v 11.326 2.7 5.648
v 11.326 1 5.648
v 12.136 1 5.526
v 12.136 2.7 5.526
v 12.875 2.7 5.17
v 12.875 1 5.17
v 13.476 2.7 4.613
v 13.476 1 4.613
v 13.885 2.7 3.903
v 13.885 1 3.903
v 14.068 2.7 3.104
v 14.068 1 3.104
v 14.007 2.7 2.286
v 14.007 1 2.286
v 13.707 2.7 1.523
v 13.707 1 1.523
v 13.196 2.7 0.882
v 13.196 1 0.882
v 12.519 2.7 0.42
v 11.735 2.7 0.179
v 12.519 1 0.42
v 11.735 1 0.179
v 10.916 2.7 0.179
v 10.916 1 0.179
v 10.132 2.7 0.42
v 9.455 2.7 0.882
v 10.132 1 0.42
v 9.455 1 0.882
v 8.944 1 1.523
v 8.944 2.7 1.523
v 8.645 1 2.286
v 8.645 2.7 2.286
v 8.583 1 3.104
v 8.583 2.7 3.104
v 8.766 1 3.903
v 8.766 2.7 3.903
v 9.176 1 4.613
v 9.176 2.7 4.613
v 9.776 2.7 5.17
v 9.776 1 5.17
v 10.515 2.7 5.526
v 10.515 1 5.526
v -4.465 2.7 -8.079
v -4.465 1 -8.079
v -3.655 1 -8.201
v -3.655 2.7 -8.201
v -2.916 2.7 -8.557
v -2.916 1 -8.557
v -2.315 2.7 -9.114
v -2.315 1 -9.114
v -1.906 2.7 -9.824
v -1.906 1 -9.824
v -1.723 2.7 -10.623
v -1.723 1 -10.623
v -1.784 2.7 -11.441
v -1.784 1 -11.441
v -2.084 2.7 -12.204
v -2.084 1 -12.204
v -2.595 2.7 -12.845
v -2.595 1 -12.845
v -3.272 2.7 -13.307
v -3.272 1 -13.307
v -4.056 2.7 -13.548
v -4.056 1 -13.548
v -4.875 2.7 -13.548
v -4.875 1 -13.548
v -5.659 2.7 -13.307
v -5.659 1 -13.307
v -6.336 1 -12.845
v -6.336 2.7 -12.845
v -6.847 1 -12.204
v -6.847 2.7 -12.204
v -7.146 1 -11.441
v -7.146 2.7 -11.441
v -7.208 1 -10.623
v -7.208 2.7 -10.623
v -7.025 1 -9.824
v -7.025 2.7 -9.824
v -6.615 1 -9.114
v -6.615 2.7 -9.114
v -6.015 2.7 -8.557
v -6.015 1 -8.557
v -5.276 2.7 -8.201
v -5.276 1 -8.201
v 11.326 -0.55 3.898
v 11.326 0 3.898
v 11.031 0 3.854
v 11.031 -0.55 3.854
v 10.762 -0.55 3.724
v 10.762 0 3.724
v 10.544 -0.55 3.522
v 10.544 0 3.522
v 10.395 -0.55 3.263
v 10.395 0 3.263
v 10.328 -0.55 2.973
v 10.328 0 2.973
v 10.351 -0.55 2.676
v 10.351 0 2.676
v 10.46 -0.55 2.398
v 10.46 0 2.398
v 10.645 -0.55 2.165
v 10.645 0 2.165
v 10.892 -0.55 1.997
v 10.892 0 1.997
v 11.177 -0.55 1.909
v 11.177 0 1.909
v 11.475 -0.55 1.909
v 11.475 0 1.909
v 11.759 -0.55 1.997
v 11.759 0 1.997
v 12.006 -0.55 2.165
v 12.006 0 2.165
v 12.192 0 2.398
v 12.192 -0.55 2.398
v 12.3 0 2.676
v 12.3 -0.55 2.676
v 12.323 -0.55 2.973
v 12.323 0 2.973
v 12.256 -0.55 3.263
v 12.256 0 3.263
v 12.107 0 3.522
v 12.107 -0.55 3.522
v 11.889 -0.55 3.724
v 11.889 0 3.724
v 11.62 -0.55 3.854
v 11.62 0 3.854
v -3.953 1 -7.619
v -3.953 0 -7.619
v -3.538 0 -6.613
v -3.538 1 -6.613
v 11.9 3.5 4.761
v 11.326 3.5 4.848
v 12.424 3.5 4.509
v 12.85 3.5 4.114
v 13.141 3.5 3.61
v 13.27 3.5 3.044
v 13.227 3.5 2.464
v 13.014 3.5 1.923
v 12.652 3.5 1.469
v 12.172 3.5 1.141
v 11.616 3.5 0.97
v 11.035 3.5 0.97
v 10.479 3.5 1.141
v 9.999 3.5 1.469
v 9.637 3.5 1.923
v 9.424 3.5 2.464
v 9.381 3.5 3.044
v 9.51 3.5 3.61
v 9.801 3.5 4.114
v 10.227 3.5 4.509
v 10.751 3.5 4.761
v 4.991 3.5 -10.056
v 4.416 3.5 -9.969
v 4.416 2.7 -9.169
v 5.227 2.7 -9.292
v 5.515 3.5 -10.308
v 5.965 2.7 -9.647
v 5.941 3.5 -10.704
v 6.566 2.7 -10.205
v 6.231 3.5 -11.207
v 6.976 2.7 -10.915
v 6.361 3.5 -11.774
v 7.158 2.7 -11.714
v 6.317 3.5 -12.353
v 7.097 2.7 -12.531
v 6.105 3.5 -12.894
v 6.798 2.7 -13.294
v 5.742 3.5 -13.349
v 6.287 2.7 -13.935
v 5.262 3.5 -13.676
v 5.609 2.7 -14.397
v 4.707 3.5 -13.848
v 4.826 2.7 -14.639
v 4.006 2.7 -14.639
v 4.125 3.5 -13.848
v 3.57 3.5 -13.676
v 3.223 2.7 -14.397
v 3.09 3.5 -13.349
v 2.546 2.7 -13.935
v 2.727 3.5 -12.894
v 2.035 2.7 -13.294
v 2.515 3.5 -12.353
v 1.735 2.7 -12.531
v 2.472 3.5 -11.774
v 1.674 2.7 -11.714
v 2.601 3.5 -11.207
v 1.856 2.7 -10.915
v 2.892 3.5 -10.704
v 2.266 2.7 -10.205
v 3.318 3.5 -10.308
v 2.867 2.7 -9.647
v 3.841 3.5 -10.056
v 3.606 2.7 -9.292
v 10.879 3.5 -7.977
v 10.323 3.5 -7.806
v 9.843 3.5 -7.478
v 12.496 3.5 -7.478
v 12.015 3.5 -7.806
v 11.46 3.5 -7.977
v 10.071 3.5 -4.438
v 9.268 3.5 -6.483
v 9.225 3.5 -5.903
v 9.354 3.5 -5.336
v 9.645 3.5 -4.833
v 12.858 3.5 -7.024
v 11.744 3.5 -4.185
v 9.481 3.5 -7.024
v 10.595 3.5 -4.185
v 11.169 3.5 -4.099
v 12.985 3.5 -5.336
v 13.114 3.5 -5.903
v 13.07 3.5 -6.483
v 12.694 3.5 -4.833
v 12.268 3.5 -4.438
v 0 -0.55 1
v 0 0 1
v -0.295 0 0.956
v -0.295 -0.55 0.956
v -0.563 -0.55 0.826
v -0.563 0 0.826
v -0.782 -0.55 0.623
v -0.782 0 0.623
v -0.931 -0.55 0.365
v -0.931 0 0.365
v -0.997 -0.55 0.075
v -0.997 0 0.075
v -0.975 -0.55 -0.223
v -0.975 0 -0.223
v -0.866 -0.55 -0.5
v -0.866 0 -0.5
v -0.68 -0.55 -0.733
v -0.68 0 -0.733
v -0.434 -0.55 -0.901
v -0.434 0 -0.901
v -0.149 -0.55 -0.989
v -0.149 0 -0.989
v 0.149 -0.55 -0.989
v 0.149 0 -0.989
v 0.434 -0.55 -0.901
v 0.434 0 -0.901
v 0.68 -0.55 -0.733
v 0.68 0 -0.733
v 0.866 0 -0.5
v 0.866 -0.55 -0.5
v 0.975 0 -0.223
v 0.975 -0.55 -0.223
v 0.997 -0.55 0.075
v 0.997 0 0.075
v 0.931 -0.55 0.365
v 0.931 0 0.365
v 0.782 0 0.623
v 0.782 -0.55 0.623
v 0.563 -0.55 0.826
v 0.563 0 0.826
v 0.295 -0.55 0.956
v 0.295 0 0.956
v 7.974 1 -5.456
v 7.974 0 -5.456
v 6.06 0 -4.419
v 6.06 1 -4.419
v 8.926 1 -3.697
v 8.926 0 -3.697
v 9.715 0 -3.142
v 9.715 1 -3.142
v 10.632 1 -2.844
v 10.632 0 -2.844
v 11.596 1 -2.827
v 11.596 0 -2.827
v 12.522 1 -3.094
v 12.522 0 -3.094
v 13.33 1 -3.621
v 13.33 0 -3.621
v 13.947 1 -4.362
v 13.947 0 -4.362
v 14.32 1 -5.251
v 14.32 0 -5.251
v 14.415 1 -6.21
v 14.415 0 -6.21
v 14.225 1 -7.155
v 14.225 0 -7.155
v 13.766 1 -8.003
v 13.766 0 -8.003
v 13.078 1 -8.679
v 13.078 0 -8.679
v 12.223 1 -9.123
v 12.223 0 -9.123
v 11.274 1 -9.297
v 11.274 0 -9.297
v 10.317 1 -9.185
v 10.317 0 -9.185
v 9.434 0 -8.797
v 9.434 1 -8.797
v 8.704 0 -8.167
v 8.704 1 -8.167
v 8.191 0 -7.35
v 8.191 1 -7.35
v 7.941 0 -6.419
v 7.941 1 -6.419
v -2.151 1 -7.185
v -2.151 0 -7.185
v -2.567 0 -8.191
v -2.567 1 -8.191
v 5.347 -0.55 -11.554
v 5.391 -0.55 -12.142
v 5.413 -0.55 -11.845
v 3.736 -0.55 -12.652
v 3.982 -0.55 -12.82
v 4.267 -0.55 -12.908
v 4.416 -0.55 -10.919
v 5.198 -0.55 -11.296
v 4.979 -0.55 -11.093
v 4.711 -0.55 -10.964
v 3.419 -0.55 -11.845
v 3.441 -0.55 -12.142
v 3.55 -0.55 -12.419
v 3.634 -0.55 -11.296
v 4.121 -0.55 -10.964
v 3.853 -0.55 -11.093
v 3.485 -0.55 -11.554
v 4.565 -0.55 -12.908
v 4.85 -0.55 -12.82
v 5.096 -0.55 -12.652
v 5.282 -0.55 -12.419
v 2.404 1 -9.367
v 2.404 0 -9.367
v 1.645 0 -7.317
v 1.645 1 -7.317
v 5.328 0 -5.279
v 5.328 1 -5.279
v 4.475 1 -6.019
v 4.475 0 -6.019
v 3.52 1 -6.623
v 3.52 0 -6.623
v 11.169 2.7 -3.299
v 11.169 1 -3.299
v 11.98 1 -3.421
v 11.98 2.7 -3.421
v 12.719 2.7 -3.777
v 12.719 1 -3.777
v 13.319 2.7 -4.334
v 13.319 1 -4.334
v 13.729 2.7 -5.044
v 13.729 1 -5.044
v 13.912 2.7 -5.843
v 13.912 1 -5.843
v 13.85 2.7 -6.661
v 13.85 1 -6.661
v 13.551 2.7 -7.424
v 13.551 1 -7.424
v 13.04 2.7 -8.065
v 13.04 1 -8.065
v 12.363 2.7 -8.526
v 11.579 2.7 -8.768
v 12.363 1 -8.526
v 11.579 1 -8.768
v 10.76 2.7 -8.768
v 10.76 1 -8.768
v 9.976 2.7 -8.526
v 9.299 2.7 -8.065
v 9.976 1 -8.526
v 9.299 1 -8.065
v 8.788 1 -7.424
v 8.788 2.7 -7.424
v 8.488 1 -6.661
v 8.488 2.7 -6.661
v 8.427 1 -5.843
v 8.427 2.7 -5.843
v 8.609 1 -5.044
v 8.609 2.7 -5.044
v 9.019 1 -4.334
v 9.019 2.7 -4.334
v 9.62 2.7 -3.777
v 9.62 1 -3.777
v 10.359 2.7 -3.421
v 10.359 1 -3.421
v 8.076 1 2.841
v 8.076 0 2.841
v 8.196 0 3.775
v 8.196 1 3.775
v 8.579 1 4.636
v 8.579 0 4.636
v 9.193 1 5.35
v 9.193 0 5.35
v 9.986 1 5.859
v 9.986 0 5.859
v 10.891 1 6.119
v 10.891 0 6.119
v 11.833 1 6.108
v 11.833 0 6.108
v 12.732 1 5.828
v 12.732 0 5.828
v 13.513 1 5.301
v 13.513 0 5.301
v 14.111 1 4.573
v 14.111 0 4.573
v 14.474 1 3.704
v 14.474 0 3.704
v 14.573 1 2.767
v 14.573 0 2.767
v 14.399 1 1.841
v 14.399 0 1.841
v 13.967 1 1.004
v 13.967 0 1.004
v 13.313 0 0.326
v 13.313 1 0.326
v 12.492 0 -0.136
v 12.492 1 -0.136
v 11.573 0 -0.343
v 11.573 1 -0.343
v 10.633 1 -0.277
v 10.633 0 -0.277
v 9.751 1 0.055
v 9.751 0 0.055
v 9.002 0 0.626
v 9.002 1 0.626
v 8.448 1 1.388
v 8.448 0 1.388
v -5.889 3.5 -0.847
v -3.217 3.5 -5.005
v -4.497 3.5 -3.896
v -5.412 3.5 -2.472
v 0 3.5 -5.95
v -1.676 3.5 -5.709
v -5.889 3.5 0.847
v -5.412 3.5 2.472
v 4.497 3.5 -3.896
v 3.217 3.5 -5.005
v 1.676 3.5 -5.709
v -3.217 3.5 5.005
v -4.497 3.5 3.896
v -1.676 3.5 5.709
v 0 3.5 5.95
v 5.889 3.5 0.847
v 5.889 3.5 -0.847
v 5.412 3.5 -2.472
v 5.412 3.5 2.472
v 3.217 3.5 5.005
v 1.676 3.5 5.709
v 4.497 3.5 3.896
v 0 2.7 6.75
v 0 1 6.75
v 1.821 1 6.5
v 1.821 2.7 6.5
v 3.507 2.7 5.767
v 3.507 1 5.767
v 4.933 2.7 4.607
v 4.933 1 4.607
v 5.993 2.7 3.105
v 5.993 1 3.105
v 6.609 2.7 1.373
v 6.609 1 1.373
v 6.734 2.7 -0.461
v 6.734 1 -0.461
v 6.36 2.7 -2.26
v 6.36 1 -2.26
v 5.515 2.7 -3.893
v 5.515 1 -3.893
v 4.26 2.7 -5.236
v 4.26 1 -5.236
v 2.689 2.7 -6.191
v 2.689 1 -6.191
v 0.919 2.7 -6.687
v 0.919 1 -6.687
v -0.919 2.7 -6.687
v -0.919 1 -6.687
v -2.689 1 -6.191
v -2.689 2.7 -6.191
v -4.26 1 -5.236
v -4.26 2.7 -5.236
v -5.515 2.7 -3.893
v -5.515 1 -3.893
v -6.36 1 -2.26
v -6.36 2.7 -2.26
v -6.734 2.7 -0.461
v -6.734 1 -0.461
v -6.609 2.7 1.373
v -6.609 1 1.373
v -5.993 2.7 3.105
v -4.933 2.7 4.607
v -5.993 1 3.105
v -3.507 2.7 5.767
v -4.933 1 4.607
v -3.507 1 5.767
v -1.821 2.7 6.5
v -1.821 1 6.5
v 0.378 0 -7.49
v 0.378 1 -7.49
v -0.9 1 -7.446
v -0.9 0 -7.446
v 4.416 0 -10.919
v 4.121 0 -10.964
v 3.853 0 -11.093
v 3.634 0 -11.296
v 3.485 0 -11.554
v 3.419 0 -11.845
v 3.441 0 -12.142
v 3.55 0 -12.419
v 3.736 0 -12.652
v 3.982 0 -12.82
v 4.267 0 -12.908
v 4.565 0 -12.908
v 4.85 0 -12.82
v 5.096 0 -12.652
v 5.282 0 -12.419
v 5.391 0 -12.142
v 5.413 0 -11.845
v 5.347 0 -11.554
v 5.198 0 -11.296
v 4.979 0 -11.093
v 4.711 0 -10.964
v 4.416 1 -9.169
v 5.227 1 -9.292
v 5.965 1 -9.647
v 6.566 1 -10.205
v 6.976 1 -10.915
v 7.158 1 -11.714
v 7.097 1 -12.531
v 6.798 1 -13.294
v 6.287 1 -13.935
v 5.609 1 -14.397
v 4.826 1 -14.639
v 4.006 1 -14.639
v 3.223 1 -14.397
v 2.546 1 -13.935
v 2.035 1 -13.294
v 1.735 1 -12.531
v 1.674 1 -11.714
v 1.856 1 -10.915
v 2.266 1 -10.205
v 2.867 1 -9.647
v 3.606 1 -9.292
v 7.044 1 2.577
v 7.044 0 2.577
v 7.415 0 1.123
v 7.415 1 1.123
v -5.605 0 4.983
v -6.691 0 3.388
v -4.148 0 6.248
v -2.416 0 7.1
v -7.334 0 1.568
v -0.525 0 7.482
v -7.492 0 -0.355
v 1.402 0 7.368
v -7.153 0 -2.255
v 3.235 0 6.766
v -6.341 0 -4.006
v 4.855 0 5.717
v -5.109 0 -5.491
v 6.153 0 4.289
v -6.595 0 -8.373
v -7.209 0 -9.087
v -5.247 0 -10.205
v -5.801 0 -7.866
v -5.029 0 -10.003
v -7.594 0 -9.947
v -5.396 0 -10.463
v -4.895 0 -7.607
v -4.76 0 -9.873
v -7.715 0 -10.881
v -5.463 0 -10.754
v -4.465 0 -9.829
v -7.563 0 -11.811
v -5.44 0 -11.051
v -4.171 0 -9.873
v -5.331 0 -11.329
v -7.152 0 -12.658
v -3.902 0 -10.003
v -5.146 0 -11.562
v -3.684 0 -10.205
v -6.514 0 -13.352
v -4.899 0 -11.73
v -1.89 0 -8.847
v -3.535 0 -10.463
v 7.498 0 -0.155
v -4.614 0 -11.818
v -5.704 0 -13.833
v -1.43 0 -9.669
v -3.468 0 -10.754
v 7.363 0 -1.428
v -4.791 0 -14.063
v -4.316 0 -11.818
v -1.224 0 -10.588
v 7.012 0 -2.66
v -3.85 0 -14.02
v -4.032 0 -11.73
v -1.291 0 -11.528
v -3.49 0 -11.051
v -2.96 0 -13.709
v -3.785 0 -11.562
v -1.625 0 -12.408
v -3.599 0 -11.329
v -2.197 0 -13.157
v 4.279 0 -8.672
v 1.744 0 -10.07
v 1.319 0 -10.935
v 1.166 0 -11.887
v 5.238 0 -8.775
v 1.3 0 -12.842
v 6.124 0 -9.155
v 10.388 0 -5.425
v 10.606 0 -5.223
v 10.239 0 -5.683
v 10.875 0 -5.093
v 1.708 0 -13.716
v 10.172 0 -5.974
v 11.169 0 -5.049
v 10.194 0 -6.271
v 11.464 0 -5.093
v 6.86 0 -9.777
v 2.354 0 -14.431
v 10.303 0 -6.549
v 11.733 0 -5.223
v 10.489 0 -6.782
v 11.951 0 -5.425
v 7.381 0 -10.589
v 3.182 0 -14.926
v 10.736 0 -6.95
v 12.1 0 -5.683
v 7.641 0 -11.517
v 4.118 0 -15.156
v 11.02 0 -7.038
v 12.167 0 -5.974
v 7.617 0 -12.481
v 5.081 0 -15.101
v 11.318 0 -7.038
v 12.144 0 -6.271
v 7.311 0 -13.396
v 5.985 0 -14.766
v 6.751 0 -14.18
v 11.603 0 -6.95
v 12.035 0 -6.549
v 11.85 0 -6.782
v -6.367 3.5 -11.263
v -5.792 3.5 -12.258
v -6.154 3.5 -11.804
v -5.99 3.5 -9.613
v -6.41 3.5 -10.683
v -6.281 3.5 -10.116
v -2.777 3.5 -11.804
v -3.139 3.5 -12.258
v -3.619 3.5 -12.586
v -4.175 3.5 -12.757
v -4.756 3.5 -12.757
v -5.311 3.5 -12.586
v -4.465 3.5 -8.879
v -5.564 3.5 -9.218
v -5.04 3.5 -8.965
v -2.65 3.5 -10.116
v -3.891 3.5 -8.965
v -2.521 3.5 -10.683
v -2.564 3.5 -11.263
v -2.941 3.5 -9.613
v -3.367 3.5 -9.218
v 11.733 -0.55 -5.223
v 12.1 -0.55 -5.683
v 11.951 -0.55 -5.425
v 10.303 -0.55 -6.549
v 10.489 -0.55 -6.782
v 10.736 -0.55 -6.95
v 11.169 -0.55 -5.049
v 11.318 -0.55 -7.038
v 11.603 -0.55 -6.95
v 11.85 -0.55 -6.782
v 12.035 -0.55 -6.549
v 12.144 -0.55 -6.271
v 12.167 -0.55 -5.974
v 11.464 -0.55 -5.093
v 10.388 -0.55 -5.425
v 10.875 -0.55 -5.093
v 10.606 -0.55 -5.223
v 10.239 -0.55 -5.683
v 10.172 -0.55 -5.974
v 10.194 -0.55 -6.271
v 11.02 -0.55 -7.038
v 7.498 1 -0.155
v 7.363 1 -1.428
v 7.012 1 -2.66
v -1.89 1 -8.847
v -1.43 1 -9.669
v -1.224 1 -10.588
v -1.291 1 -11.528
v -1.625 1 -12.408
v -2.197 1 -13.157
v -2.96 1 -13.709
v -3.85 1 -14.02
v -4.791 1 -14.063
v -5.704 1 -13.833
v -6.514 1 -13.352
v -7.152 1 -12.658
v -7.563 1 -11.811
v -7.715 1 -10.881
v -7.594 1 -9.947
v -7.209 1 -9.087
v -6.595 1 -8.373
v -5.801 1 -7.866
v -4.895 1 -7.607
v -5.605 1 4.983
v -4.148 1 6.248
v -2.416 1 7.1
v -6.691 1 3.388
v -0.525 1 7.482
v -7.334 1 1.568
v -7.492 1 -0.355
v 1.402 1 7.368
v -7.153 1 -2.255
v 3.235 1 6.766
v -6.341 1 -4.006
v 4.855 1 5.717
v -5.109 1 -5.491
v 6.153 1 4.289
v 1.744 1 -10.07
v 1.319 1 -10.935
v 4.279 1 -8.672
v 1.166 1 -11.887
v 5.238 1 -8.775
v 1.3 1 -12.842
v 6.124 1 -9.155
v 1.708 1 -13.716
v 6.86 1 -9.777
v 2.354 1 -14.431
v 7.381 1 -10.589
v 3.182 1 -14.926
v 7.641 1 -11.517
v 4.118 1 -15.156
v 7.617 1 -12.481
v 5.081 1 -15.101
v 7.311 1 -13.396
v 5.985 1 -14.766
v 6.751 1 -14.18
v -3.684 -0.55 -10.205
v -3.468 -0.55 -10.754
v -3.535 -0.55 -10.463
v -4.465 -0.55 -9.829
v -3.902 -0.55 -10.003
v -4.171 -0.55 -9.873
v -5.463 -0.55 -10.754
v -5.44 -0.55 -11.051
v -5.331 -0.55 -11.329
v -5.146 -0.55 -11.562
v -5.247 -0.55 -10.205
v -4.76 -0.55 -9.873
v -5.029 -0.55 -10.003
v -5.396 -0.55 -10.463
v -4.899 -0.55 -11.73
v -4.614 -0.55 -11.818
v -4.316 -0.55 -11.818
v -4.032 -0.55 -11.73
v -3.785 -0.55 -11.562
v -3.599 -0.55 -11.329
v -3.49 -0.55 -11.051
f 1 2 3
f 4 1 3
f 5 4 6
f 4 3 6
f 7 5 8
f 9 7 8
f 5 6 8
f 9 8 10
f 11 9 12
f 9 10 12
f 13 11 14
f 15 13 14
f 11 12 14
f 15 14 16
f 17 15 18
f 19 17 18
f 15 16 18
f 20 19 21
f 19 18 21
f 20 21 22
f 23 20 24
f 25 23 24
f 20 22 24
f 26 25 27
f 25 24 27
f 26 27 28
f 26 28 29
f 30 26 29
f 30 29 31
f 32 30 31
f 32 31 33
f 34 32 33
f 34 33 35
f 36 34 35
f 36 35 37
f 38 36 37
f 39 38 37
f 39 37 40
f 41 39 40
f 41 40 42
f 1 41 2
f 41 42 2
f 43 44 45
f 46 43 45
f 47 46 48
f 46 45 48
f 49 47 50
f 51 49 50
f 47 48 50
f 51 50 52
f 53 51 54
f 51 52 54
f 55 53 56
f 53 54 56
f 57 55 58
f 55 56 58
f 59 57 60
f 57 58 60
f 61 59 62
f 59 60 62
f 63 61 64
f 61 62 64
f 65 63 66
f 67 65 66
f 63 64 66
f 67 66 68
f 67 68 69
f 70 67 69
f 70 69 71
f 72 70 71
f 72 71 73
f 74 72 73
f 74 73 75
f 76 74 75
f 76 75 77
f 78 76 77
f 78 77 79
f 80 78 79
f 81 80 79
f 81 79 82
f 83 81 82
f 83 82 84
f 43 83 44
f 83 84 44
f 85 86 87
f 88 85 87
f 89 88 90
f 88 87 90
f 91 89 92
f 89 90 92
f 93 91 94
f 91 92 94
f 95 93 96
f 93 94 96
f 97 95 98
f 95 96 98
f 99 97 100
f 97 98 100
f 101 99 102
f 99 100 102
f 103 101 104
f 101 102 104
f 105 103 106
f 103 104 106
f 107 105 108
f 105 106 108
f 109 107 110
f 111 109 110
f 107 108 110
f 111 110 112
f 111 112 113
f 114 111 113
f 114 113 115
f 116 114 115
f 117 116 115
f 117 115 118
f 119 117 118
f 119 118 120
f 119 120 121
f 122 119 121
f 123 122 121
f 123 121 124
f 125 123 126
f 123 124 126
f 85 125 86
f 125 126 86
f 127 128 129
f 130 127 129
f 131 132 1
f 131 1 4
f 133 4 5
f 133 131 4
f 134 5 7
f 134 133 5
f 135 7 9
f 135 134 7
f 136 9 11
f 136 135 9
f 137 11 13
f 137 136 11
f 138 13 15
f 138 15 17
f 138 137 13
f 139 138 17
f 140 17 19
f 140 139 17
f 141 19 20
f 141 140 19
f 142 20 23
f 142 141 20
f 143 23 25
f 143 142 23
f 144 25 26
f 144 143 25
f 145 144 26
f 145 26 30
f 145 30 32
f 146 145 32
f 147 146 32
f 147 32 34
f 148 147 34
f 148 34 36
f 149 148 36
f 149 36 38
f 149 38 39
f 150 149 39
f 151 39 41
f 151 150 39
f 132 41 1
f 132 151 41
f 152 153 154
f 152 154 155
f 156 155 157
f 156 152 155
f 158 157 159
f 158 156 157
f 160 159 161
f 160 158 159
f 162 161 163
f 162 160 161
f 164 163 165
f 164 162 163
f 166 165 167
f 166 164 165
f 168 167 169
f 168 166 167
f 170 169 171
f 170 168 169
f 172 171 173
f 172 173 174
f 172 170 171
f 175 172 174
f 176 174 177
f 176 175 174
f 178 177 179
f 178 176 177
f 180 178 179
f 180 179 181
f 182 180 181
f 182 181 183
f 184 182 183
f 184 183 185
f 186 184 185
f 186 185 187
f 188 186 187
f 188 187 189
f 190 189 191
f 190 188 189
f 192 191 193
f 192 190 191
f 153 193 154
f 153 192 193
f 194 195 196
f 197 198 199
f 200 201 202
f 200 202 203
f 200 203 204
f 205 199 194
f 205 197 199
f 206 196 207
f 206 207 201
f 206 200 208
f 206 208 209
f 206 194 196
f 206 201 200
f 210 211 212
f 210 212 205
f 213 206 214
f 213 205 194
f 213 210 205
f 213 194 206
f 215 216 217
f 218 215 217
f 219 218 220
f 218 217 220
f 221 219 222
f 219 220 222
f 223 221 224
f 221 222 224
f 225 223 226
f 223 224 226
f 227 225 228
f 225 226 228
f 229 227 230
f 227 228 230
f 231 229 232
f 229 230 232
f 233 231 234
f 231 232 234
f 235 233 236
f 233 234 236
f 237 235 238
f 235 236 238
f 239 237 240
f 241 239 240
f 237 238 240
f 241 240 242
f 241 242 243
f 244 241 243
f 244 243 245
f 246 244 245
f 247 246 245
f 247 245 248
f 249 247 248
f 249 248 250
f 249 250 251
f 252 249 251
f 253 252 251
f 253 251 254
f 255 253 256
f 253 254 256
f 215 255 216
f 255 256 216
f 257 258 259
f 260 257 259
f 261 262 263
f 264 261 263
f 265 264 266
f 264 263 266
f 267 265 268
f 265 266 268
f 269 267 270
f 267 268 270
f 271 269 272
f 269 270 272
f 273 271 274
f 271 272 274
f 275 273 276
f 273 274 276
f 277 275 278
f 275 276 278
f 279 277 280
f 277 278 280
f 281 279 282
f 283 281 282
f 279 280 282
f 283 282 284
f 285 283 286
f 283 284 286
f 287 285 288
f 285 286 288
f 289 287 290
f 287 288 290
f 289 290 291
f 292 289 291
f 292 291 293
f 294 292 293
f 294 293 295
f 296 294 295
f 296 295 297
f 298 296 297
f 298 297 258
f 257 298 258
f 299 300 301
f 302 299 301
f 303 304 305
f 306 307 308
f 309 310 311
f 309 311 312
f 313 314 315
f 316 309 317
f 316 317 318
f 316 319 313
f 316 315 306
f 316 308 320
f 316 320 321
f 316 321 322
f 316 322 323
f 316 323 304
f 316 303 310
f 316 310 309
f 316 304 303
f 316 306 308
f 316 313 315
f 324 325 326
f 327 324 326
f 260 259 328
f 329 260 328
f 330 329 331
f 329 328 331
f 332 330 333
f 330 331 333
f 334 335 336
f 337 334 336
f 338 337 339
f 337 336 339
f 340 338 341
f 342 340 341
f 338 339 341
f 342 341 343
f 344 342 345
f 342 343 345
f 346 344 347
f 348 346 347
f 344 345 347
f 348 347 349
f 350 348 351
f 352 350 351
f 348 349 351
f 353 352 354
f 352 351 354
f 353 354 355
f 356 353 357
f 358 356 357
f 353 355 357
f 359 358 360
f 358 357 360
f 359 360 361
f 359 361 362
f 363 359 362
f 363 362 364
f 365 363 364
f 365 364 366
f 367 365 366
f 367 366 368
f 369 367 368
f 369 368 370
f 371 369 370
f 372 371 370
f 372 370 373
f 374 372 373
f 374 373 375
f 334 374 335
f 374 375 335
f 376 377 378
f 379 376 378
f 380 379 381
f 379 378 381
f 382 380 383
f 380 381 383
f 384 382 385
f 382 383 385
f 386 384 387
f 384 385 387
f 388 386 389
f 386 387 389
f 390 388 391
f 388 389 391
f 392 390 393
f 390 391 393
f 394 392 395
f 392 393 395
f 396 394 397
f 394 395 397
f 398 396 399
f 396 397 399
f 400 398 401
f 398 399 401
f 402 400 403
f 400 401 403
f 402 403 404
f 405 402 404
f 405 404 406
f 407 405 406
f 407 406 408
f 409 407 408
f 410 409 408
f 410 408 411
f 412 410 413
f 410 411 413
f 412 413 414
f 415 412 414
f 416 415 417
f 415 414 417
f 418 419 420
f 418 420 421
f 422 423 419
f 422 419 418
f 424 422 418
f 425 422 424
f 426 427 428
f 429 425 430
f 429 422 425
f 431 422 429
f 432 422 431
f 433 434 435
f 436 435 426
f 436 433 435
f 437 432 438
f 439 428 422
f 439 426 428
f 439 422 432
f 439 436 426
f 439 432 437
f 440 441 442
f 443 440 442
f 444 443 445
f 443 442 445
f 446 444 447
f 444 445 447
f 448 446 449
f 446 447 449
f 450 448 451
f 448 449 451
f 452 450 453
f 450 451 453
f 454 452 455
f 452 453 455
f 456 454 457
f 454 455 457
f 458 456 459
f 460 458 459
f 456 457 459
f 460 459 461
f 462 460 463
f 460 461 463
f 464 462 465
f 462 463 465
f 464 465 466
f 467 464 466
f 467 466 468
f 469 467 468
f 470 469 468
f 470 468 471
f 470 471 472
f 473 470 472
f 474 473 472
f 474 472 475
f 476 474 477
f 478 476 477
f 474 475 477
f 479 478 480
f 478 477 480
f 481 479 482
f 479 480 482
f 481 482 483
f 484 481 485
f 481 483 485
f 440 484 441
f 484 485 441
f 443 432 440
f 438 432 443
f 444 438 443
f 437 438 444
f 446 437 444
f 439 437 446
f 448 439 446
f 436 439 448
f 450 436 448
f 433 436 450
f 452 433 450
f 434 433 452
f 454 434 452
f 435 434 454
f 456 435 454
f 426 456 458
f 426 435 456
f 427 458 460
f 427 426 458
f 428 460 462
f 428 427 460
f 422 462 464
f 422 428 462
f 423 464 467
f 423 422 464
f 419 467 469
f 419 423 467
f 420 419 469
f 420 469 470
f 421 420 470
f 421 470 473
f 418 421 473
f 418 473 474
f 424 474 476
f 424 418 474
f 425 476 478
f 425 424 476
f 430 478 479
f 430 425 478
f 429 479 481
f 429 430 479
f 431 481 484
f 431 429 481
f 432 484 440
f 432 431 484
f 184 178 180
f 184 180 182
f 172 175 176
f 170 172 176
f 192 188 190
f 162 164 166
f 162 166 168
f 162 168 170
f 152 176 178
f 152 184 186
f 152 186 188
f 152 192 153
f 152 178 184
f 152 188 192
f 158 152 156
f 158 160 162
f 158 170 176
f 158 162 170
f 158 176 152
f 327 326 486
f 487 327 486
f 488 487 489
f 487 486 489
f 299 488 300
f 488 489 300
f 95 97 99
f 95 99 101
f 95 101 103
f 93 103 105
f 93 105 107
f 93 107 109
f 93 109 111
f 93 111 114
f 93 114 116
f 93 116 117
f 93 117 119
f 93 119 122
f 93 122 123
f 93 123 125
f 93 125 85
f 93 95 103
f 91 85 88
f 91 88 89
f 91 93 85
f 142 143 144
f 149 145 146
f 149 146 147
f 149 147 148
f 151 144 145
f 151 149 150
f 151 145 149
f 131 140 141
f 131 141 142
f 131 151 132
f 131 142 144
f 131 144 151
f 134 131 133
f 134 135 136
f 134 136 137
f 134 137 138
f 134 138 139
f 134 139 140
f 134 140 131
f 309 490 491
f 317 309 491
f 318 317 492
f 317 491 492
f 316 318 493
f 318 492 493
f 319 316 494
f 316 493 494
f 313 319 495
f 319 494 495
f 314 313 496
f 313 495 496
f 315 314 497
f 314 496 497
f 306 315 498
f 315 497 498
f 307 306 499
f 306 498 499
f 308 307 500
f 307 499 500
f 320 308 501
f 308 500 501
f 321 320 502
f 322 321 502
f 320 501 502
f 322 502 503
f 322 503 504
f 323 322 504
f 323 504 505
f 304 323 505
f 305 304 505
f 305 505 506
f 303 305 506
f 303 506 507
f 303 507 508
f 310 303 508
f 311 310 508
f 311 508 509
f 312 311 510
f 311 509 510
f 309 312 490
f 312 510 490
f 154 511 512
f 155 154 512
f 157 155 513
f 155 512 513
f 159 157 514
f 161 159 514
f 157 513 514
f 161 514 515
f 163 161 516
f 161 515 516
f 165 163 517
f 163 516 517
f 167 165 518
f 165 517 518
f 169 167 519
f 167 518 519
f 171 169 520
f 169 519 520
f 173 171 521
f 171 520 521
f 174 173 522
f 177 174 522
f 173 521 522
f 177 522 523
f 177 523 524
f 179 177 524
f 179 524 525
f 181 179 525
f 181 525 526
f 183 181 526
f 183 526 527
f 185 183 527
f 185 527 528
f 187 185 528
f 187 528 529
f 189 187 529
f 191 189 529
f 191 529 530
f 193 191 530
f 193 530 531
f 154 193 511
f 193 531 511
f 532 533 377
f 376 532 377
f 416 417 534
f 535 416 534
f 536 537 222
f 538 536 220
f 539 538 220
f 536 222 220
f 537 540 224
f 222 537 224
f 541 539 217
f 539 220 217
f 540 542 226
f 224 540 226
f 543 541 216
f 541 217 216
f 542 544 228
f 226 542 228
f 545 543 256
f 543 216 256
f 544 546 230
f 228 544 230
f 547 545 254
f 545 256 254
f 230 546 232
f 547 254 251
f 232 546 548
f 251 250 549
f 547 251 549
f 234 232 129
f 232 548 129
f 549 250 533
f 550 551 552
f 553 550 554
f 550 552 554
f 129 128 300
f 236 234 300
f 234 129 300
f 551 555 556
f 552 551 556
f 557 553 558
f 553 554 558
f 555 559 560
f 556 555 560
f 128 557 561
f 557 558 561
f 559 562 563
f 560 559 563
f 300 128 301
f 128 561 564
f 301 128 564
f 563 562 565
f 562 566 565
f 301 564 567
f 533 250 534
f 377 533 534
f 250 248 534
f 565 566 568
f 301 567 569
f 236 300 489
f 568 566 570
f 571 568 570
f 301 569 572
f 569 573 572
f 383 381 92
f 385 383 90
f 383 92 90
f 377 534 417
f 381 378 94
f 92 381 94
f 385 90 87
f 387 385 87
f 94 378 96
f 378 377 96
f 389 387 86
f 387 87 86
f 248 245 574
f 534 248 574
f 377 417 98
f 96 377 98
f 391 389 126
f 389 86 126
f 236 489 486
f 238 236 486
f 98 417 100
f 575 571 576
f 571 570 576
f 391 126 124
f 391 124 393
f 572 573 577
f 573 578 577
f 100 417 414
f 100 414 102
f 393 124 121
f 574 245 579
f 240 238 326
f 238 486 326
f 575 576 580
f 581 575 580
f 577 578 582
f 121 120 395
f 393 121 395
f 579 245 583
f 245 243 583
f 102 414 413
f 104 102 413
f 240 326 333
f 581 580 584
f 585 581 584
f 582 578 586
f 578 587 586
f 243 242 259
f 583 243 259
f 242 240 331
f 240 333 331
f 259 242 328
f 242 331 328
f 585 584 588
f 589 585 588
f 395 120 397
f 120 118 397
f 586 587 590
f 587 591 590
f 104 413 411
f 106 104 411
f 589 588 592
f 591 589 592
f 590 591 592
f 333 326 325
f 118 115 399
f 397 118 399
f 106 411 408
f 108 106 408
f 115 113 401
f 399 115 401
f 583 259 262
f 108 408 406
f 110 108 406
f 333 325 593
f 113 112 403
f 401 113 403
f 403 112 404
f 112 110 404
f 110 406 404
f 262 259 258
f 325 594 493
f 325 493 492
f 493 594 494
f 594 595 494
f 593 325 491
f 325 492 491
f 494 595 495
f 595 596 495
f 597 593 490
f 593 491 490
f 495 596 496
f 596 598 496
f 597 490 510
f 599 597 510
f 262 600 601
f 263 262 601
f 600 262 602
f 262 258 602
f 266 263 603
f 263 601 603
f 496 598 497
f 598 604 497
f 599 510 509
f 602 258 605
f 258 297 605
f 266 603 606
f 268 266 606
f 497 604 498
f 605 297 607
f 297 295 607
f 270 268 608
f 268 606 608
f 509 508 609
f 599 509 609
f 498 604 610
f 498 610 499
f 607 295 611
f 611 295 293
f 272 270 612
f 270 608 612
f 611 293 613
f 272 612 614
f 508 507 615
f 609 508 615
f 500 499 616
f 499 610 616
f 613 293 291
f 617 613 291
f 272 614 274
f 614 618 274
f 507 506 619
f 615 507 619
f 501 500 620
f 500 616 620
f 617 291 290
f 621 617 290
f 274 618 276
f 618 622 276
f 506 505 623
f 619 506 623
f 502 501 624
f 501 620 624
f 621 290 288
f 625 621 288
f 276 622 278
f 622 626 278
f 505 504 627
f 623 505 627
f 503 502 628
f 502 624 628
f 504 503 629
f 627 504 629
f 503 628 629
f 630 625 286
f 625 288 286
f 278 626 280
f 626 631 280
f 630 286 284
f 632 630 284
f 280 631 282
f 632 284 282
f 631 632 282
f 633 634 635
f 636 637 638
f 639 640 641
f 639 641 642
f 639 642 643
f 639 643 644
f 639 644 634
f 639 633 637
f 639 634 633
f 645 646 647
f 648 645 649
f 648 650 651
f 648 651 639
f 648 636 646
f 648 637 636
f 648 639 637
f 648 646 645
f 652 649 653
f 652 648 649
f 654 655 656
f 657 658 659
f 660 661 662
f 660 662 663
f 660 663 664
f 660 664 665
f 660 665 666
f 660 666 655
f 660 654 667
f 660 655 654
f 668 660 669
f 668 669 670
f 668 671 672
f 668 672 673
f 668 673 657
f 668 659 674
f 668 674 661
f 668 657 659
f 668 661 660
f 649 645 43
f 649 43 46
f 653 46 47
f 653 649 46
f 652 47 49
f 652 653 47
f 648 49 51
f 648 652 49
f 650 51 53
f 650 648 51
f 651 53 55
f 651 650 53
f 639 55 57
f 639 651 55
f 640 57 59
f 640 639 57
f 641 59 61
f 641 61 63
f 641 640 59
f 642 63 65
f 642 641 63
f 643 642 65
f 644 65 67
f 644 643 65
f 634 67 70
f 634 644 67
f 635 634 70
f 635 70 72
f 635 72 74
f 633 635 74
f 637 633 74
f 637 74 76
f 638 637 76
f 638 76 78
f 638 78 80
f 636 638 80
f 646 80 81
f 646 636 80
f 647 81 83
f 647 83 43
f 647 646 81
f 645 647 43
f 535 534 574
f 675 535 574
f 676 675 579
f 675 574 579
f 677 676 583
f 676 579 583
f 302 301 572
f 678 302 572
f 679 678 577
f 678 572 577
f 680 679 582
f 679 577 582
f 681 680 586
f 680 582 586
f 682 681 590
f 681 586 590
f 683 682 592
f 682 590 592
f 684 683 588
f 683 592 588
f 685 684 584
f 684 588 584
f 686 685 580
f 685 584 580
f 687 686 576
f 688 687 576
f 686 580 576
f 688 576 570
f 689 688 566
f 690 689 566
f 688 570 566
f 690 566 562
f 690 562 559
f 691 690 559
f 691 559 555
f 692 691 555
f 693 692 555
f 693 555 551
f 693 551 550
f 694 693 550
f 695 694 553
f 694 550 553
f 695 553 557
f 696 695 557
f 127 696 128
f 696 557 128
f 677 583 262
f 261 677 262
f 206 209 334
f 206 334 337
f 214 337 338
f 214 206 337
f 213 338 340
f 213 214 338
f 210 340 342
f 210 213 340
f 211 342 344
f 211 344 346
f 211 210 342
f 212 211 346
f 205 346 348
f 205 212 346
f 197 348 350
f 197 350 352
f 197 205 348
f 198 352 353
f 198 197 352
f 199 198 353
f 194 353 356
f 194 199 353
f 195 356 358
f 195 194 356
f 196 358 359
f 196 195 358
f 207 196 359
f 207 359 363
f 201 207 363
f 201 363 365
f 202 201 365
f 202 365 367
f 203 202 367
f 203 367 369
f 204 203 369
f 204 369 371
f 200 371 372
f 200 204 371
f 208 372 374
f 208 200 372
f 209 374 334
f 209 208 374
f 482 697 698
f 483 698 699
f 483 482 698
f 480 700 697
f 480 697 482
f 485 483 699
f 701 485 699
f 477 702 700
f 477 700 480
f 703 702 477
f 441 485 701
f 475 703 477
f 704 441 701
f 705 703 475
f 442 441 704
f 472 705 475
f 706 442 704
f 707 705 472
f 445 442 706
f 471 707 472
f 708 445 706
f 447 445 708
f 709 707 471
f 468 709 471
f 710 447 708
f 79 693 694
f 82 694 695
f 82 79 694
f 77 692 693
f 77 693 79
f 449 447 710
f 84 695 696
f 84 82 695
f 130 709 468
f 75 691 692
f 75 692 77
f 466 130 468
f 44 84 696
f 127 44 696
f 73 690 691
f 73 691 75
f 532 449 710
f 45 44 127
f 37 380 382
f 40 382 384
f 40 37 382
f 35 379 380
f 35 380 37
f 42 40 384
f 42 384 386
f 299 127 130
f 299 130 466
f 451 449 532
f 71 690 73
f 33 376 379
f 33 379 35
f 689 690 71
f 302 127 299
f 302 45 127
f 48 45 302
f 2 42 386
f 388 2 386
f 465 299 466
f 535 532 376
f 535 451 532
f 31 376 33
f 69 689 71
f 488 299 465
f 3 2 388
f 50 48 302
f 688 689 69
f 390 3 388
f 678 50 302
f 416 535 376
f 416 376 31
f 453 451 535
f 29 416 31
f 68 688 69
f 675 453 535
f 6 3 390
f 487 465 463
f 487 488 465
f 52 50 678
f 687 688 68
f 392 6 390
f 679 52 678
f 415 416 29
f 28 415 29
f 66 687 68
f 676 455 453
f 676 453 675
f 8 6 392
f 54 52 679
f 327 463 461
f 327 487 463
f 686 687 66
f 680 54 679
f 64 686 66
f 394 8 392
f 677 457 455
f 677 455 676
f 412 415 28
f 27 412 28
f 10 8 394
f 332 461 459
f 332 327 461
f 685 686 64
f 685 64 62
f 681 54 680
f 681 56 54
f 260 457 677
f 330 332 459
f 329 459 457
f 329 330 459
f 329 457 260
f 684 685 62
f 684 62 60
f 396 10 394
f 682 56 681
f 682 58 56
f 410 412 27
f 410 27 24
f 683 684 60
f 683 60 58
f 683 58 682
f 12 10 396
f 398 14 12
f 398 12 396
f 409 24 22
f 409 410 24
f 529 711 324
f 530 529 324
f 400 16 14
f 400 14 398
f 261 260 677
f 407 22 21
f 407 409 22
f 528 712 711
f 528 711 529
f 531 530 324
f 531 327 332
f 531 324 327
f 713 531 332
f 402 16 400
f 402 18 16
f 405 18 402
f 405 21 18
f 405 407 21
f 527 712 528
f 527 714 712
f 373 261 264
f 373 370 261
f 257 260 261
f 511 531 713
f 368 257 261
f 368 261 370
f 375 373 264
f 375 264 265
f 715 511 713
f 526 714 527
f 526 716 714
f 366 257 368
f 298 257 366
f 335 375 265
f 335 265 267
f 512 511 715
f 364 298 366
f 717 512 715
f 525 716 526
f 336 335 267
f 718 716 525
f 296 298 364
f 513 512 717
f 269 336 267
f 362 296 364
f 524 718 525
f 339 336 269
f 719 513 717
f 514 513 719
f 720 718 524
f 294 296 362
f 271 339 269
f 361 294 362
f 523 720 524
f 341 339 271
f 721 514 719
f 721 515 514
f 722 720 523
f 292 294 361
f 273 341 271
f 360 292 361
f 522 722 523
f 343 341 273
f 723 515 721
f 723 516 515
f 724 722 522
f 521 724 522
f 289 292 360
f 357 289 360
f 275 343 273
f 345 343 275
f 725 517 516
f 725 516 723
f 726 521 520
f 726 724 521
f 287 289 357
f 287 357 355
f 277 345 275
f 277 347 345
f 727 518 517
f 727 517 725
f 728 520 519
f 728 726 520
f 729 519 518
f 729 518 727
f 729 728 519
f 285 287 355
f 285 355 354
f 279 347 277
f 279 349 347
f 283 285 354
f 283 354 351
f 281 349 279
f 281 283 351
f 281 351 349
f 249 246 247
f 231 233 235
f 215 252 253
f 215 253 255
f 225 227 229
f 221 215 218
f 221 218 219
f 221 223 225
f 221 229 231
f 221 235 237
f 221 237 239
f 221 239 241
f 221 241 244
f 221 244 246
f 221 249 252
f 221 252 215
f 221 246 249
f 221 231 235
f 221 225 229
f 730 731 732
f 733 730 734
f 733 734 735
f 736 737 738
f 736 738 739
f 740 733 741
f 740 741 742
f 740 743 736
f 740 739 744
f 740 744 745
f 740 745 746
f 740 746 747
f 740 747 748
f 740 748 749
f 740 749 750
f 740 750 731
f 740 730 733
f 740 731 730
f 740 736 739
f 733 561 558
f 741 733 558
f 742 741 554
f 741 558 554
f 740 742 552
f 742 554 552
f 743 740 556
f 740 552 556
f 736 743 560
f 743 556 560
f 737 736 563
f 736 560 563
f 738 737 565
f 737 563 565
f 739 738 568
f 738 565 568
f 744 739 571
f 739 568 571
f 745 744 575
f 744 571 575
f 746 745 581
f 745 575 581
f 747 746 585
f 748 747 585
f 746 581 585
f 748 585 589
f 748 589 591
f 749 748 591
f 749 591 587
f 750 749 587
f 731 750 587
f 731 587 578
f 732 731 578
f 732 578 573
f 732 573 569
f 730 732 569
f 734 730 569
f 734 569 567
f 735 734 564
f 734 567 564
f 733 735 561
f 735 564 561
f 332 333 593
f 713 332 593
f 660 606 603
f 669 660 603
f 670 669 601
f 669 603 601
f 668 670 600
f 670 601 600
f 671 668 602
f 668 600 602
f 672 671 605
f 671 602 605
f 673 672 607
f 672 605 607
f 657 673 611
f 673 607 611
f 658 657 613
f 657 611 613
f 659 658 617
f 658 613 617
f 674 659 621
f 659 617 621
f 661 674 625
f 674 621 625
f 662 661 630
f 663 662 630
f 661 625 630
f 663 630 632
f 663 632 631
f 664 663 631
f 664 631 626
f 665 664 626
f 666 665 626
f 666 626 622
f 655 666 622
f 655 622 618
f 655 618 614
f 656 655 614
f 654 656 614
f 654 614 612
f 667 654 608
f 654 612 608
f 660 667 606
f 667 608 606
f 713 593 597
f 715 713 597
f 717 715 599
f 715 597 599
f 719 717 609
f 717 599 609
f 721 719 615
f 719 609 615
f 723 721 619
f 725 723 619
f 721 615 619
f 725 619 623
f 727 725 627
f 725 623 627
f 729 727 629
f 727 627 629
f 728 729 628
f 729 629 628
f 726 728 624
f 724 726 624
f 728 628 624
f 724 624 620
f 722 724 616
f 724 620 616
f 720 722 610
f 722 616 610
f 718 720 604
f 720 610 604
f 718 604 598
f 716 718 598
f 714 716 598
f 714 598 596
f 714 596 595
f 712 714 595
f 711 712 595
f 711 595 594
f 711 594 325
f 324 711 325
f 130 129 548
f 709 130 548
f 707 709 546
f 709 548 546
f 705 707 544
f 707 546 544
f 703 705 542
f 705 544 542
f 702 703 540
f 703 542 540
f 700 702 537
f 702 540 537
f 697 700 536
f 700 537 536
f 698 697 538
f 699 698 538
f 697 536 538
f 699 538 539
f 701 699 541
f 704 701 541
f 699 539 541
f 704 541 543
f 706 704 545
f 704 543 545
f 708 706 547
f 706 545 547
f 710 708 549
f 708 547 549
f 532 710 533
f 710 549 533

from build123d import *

# Parameters (mm, degrees)
SKETCH_1_R      = 3.25
SKETCH_1_R_2    = 7.5
EXTRUDE_1_DEPTH = 1
SKETCH_2_R      = 6.75
SKETCH_2_R_2    = 2.75
EXTRUDE_2_DEPTH = 2.5
CHAMFER_1_SIZE  = 0.8
SKETCH_3_R      = 1
EXTRUDE_3_DEPTH = 0.55


with BuildPart() as part:
    # 草图1 → 凸台-拉伸1 (new body)
    with BuildSketch(Plane(origin=(0, 0, 0), x_dir=(1, 0, 0), z_dir=(0, 1, 0))):
        with Locations((-4.465418824, 10.828840308)):
            Circle(SKETCH_1_R)
        with BuildLine():
            Line((-3.953247825, 7.619450823), (-3.538203787, 6.612950473))
            ThreePointArc((-3.538203787, 6.612950473), (-2.859173271, 6.933623022), (-2.151479183, 7.184785127))
            Line((-2.151479183, 7.184785127), (-2.56652322, 8.191285477))
            ThreePointArc((-2.56652322, 8.191285477), (-3.22644374, 7.824270332), (-3.953247825, 7.619450823))
        make_face()
        Circle(SKETCH_1_R_2)
        with Locations((4.416088752, 11.919352316)):
            Circle(SKETCH_1_R)
        with BuildLine():
            Line((2.404044607, 9.367063468), (1.64466801, 7.317449497))
            ThreePointArc((1.64466801, 7.317449497), (2.605643113, 7.03282475), (3.520087943, 6.622611333))
            Line((3.520087943, 6.622611333), (4.279464541, 8.672225305))
            ThreePointArc((4.279464541, 8.672225305), (3.286976736, 8.871794924), (2.404044607, 9.367063468))
        make_face()
        with BuildLine():
            ThreePointArc((6.059916763, 4.418982782), (6.595006984, 3.571537887), (7.012326866, 2.660314252))
            Line((7.012326866, 2.660314252), (8.926399669, 3.696883819))
            ThreePointArc((8.926399669, 3.696883819), (8.311549297, 4.501134462), (7.973989566, 5.455552349))
            Line((7.973989566, 5.455552349), (6.059916763, 4.418982782))
        make_face()
        with Locations((11.169385657, 6.048800879)):
            Circle(SKETCH_1_R)
        with Locations((11.325553388, -2.898042413)):
            Circle(SKETCH_1_R)
        with BuildLine():
            Line((7.043551493, -2.576505845), (8.076059132, -2.840709353))
            ThreePointArc((8.076059132, -2.840709353), (8.176998527, -2.092373567), (8.447906292, -1.387530186))
            Line((8.447906292, -1.387530186), (7.415398652, -1.123326679))
            ThreePointArc((7.415398652, -1.123326679), (7.265895832, -1.859235798), (7.043551493, -2.576505845))
        make_face()
    extrude(amount=EXTRUDE_1_DEPTH)

    # 草图2 → 凸台-拉伸2 (add)
    with BuildSketch(Plane(origin=(0, 1, 0), x_dir=(1, 0, 0), z_dir=(0, 1, 0))):
        with Locations(Location((0, 0, 0), (0, 0, 270))):
            Circle(SKETCH_2_R)
        with Locations(Location((-4.465418824, 10.828840308, 0), (0, 0, 270))):
            Circle(SKETCH_2_R_2)
        with Locations(Location((4.416088752, 11.919352316, 0), (0, 0, 270))):
            Circle(SKETCH_2_R_2)
        with Locations(Location((11.169385657, 6.048800879, 0), (0, 0, 270))):
            Circle(SKETCH_2_R_2)
        with Locations(Location((11.325553388, -2.898042413, 0), (0, 0, 270))):
            Circle(SKETCH_2_R_2)
    extrude(amount=EXTRUDE_2_DEPTH)

    # 倒角1
    chamfer_1_edges = [part.edges().sort_by_distance(p)[0] for p in [
        (0, 3.5, -6.75),
        (-4.465418824, 3.5, -13.578840308),
        (4.416088752, 3.5, -14.669352316),
        (11.169385657, 3.5, -8.798800879),
        (11.325553388, 3.5, 0.148042413),
    ]]
    chamfer(chamfer_1_edges, length=CHAMFER_1_SIZE)

    # 草图3 → 凸台-拉伸3 (add)
    with BuildSketch(Plane.XZ):
        with Locations(Location((0, 0, 0), (0, 0, 90))):
            Circle(SKETCH_3_R)
        with Locations(Location((11.325553388, 2.898042413, 0), (0, 0, 90))):
            Circle(SKETCH_3_R)
        with Locations(Location((11.169385657, -6.048800879, 0), (0, 0, 90))):
            Circle(SKETCH_3_R)
        with Locations(Location((4.416088752, -11.919352316, 0), (0, 0, 90))):
            Circle(SKETCH_3_R)
        with Locations(Location((-4.465418824, -10.828840308, 0), (0, 0, 90))):
            Circle(SKETCH_3_R)
    extrude(amount=EXTRUDE_3_DEPTH)


solid = part.part
